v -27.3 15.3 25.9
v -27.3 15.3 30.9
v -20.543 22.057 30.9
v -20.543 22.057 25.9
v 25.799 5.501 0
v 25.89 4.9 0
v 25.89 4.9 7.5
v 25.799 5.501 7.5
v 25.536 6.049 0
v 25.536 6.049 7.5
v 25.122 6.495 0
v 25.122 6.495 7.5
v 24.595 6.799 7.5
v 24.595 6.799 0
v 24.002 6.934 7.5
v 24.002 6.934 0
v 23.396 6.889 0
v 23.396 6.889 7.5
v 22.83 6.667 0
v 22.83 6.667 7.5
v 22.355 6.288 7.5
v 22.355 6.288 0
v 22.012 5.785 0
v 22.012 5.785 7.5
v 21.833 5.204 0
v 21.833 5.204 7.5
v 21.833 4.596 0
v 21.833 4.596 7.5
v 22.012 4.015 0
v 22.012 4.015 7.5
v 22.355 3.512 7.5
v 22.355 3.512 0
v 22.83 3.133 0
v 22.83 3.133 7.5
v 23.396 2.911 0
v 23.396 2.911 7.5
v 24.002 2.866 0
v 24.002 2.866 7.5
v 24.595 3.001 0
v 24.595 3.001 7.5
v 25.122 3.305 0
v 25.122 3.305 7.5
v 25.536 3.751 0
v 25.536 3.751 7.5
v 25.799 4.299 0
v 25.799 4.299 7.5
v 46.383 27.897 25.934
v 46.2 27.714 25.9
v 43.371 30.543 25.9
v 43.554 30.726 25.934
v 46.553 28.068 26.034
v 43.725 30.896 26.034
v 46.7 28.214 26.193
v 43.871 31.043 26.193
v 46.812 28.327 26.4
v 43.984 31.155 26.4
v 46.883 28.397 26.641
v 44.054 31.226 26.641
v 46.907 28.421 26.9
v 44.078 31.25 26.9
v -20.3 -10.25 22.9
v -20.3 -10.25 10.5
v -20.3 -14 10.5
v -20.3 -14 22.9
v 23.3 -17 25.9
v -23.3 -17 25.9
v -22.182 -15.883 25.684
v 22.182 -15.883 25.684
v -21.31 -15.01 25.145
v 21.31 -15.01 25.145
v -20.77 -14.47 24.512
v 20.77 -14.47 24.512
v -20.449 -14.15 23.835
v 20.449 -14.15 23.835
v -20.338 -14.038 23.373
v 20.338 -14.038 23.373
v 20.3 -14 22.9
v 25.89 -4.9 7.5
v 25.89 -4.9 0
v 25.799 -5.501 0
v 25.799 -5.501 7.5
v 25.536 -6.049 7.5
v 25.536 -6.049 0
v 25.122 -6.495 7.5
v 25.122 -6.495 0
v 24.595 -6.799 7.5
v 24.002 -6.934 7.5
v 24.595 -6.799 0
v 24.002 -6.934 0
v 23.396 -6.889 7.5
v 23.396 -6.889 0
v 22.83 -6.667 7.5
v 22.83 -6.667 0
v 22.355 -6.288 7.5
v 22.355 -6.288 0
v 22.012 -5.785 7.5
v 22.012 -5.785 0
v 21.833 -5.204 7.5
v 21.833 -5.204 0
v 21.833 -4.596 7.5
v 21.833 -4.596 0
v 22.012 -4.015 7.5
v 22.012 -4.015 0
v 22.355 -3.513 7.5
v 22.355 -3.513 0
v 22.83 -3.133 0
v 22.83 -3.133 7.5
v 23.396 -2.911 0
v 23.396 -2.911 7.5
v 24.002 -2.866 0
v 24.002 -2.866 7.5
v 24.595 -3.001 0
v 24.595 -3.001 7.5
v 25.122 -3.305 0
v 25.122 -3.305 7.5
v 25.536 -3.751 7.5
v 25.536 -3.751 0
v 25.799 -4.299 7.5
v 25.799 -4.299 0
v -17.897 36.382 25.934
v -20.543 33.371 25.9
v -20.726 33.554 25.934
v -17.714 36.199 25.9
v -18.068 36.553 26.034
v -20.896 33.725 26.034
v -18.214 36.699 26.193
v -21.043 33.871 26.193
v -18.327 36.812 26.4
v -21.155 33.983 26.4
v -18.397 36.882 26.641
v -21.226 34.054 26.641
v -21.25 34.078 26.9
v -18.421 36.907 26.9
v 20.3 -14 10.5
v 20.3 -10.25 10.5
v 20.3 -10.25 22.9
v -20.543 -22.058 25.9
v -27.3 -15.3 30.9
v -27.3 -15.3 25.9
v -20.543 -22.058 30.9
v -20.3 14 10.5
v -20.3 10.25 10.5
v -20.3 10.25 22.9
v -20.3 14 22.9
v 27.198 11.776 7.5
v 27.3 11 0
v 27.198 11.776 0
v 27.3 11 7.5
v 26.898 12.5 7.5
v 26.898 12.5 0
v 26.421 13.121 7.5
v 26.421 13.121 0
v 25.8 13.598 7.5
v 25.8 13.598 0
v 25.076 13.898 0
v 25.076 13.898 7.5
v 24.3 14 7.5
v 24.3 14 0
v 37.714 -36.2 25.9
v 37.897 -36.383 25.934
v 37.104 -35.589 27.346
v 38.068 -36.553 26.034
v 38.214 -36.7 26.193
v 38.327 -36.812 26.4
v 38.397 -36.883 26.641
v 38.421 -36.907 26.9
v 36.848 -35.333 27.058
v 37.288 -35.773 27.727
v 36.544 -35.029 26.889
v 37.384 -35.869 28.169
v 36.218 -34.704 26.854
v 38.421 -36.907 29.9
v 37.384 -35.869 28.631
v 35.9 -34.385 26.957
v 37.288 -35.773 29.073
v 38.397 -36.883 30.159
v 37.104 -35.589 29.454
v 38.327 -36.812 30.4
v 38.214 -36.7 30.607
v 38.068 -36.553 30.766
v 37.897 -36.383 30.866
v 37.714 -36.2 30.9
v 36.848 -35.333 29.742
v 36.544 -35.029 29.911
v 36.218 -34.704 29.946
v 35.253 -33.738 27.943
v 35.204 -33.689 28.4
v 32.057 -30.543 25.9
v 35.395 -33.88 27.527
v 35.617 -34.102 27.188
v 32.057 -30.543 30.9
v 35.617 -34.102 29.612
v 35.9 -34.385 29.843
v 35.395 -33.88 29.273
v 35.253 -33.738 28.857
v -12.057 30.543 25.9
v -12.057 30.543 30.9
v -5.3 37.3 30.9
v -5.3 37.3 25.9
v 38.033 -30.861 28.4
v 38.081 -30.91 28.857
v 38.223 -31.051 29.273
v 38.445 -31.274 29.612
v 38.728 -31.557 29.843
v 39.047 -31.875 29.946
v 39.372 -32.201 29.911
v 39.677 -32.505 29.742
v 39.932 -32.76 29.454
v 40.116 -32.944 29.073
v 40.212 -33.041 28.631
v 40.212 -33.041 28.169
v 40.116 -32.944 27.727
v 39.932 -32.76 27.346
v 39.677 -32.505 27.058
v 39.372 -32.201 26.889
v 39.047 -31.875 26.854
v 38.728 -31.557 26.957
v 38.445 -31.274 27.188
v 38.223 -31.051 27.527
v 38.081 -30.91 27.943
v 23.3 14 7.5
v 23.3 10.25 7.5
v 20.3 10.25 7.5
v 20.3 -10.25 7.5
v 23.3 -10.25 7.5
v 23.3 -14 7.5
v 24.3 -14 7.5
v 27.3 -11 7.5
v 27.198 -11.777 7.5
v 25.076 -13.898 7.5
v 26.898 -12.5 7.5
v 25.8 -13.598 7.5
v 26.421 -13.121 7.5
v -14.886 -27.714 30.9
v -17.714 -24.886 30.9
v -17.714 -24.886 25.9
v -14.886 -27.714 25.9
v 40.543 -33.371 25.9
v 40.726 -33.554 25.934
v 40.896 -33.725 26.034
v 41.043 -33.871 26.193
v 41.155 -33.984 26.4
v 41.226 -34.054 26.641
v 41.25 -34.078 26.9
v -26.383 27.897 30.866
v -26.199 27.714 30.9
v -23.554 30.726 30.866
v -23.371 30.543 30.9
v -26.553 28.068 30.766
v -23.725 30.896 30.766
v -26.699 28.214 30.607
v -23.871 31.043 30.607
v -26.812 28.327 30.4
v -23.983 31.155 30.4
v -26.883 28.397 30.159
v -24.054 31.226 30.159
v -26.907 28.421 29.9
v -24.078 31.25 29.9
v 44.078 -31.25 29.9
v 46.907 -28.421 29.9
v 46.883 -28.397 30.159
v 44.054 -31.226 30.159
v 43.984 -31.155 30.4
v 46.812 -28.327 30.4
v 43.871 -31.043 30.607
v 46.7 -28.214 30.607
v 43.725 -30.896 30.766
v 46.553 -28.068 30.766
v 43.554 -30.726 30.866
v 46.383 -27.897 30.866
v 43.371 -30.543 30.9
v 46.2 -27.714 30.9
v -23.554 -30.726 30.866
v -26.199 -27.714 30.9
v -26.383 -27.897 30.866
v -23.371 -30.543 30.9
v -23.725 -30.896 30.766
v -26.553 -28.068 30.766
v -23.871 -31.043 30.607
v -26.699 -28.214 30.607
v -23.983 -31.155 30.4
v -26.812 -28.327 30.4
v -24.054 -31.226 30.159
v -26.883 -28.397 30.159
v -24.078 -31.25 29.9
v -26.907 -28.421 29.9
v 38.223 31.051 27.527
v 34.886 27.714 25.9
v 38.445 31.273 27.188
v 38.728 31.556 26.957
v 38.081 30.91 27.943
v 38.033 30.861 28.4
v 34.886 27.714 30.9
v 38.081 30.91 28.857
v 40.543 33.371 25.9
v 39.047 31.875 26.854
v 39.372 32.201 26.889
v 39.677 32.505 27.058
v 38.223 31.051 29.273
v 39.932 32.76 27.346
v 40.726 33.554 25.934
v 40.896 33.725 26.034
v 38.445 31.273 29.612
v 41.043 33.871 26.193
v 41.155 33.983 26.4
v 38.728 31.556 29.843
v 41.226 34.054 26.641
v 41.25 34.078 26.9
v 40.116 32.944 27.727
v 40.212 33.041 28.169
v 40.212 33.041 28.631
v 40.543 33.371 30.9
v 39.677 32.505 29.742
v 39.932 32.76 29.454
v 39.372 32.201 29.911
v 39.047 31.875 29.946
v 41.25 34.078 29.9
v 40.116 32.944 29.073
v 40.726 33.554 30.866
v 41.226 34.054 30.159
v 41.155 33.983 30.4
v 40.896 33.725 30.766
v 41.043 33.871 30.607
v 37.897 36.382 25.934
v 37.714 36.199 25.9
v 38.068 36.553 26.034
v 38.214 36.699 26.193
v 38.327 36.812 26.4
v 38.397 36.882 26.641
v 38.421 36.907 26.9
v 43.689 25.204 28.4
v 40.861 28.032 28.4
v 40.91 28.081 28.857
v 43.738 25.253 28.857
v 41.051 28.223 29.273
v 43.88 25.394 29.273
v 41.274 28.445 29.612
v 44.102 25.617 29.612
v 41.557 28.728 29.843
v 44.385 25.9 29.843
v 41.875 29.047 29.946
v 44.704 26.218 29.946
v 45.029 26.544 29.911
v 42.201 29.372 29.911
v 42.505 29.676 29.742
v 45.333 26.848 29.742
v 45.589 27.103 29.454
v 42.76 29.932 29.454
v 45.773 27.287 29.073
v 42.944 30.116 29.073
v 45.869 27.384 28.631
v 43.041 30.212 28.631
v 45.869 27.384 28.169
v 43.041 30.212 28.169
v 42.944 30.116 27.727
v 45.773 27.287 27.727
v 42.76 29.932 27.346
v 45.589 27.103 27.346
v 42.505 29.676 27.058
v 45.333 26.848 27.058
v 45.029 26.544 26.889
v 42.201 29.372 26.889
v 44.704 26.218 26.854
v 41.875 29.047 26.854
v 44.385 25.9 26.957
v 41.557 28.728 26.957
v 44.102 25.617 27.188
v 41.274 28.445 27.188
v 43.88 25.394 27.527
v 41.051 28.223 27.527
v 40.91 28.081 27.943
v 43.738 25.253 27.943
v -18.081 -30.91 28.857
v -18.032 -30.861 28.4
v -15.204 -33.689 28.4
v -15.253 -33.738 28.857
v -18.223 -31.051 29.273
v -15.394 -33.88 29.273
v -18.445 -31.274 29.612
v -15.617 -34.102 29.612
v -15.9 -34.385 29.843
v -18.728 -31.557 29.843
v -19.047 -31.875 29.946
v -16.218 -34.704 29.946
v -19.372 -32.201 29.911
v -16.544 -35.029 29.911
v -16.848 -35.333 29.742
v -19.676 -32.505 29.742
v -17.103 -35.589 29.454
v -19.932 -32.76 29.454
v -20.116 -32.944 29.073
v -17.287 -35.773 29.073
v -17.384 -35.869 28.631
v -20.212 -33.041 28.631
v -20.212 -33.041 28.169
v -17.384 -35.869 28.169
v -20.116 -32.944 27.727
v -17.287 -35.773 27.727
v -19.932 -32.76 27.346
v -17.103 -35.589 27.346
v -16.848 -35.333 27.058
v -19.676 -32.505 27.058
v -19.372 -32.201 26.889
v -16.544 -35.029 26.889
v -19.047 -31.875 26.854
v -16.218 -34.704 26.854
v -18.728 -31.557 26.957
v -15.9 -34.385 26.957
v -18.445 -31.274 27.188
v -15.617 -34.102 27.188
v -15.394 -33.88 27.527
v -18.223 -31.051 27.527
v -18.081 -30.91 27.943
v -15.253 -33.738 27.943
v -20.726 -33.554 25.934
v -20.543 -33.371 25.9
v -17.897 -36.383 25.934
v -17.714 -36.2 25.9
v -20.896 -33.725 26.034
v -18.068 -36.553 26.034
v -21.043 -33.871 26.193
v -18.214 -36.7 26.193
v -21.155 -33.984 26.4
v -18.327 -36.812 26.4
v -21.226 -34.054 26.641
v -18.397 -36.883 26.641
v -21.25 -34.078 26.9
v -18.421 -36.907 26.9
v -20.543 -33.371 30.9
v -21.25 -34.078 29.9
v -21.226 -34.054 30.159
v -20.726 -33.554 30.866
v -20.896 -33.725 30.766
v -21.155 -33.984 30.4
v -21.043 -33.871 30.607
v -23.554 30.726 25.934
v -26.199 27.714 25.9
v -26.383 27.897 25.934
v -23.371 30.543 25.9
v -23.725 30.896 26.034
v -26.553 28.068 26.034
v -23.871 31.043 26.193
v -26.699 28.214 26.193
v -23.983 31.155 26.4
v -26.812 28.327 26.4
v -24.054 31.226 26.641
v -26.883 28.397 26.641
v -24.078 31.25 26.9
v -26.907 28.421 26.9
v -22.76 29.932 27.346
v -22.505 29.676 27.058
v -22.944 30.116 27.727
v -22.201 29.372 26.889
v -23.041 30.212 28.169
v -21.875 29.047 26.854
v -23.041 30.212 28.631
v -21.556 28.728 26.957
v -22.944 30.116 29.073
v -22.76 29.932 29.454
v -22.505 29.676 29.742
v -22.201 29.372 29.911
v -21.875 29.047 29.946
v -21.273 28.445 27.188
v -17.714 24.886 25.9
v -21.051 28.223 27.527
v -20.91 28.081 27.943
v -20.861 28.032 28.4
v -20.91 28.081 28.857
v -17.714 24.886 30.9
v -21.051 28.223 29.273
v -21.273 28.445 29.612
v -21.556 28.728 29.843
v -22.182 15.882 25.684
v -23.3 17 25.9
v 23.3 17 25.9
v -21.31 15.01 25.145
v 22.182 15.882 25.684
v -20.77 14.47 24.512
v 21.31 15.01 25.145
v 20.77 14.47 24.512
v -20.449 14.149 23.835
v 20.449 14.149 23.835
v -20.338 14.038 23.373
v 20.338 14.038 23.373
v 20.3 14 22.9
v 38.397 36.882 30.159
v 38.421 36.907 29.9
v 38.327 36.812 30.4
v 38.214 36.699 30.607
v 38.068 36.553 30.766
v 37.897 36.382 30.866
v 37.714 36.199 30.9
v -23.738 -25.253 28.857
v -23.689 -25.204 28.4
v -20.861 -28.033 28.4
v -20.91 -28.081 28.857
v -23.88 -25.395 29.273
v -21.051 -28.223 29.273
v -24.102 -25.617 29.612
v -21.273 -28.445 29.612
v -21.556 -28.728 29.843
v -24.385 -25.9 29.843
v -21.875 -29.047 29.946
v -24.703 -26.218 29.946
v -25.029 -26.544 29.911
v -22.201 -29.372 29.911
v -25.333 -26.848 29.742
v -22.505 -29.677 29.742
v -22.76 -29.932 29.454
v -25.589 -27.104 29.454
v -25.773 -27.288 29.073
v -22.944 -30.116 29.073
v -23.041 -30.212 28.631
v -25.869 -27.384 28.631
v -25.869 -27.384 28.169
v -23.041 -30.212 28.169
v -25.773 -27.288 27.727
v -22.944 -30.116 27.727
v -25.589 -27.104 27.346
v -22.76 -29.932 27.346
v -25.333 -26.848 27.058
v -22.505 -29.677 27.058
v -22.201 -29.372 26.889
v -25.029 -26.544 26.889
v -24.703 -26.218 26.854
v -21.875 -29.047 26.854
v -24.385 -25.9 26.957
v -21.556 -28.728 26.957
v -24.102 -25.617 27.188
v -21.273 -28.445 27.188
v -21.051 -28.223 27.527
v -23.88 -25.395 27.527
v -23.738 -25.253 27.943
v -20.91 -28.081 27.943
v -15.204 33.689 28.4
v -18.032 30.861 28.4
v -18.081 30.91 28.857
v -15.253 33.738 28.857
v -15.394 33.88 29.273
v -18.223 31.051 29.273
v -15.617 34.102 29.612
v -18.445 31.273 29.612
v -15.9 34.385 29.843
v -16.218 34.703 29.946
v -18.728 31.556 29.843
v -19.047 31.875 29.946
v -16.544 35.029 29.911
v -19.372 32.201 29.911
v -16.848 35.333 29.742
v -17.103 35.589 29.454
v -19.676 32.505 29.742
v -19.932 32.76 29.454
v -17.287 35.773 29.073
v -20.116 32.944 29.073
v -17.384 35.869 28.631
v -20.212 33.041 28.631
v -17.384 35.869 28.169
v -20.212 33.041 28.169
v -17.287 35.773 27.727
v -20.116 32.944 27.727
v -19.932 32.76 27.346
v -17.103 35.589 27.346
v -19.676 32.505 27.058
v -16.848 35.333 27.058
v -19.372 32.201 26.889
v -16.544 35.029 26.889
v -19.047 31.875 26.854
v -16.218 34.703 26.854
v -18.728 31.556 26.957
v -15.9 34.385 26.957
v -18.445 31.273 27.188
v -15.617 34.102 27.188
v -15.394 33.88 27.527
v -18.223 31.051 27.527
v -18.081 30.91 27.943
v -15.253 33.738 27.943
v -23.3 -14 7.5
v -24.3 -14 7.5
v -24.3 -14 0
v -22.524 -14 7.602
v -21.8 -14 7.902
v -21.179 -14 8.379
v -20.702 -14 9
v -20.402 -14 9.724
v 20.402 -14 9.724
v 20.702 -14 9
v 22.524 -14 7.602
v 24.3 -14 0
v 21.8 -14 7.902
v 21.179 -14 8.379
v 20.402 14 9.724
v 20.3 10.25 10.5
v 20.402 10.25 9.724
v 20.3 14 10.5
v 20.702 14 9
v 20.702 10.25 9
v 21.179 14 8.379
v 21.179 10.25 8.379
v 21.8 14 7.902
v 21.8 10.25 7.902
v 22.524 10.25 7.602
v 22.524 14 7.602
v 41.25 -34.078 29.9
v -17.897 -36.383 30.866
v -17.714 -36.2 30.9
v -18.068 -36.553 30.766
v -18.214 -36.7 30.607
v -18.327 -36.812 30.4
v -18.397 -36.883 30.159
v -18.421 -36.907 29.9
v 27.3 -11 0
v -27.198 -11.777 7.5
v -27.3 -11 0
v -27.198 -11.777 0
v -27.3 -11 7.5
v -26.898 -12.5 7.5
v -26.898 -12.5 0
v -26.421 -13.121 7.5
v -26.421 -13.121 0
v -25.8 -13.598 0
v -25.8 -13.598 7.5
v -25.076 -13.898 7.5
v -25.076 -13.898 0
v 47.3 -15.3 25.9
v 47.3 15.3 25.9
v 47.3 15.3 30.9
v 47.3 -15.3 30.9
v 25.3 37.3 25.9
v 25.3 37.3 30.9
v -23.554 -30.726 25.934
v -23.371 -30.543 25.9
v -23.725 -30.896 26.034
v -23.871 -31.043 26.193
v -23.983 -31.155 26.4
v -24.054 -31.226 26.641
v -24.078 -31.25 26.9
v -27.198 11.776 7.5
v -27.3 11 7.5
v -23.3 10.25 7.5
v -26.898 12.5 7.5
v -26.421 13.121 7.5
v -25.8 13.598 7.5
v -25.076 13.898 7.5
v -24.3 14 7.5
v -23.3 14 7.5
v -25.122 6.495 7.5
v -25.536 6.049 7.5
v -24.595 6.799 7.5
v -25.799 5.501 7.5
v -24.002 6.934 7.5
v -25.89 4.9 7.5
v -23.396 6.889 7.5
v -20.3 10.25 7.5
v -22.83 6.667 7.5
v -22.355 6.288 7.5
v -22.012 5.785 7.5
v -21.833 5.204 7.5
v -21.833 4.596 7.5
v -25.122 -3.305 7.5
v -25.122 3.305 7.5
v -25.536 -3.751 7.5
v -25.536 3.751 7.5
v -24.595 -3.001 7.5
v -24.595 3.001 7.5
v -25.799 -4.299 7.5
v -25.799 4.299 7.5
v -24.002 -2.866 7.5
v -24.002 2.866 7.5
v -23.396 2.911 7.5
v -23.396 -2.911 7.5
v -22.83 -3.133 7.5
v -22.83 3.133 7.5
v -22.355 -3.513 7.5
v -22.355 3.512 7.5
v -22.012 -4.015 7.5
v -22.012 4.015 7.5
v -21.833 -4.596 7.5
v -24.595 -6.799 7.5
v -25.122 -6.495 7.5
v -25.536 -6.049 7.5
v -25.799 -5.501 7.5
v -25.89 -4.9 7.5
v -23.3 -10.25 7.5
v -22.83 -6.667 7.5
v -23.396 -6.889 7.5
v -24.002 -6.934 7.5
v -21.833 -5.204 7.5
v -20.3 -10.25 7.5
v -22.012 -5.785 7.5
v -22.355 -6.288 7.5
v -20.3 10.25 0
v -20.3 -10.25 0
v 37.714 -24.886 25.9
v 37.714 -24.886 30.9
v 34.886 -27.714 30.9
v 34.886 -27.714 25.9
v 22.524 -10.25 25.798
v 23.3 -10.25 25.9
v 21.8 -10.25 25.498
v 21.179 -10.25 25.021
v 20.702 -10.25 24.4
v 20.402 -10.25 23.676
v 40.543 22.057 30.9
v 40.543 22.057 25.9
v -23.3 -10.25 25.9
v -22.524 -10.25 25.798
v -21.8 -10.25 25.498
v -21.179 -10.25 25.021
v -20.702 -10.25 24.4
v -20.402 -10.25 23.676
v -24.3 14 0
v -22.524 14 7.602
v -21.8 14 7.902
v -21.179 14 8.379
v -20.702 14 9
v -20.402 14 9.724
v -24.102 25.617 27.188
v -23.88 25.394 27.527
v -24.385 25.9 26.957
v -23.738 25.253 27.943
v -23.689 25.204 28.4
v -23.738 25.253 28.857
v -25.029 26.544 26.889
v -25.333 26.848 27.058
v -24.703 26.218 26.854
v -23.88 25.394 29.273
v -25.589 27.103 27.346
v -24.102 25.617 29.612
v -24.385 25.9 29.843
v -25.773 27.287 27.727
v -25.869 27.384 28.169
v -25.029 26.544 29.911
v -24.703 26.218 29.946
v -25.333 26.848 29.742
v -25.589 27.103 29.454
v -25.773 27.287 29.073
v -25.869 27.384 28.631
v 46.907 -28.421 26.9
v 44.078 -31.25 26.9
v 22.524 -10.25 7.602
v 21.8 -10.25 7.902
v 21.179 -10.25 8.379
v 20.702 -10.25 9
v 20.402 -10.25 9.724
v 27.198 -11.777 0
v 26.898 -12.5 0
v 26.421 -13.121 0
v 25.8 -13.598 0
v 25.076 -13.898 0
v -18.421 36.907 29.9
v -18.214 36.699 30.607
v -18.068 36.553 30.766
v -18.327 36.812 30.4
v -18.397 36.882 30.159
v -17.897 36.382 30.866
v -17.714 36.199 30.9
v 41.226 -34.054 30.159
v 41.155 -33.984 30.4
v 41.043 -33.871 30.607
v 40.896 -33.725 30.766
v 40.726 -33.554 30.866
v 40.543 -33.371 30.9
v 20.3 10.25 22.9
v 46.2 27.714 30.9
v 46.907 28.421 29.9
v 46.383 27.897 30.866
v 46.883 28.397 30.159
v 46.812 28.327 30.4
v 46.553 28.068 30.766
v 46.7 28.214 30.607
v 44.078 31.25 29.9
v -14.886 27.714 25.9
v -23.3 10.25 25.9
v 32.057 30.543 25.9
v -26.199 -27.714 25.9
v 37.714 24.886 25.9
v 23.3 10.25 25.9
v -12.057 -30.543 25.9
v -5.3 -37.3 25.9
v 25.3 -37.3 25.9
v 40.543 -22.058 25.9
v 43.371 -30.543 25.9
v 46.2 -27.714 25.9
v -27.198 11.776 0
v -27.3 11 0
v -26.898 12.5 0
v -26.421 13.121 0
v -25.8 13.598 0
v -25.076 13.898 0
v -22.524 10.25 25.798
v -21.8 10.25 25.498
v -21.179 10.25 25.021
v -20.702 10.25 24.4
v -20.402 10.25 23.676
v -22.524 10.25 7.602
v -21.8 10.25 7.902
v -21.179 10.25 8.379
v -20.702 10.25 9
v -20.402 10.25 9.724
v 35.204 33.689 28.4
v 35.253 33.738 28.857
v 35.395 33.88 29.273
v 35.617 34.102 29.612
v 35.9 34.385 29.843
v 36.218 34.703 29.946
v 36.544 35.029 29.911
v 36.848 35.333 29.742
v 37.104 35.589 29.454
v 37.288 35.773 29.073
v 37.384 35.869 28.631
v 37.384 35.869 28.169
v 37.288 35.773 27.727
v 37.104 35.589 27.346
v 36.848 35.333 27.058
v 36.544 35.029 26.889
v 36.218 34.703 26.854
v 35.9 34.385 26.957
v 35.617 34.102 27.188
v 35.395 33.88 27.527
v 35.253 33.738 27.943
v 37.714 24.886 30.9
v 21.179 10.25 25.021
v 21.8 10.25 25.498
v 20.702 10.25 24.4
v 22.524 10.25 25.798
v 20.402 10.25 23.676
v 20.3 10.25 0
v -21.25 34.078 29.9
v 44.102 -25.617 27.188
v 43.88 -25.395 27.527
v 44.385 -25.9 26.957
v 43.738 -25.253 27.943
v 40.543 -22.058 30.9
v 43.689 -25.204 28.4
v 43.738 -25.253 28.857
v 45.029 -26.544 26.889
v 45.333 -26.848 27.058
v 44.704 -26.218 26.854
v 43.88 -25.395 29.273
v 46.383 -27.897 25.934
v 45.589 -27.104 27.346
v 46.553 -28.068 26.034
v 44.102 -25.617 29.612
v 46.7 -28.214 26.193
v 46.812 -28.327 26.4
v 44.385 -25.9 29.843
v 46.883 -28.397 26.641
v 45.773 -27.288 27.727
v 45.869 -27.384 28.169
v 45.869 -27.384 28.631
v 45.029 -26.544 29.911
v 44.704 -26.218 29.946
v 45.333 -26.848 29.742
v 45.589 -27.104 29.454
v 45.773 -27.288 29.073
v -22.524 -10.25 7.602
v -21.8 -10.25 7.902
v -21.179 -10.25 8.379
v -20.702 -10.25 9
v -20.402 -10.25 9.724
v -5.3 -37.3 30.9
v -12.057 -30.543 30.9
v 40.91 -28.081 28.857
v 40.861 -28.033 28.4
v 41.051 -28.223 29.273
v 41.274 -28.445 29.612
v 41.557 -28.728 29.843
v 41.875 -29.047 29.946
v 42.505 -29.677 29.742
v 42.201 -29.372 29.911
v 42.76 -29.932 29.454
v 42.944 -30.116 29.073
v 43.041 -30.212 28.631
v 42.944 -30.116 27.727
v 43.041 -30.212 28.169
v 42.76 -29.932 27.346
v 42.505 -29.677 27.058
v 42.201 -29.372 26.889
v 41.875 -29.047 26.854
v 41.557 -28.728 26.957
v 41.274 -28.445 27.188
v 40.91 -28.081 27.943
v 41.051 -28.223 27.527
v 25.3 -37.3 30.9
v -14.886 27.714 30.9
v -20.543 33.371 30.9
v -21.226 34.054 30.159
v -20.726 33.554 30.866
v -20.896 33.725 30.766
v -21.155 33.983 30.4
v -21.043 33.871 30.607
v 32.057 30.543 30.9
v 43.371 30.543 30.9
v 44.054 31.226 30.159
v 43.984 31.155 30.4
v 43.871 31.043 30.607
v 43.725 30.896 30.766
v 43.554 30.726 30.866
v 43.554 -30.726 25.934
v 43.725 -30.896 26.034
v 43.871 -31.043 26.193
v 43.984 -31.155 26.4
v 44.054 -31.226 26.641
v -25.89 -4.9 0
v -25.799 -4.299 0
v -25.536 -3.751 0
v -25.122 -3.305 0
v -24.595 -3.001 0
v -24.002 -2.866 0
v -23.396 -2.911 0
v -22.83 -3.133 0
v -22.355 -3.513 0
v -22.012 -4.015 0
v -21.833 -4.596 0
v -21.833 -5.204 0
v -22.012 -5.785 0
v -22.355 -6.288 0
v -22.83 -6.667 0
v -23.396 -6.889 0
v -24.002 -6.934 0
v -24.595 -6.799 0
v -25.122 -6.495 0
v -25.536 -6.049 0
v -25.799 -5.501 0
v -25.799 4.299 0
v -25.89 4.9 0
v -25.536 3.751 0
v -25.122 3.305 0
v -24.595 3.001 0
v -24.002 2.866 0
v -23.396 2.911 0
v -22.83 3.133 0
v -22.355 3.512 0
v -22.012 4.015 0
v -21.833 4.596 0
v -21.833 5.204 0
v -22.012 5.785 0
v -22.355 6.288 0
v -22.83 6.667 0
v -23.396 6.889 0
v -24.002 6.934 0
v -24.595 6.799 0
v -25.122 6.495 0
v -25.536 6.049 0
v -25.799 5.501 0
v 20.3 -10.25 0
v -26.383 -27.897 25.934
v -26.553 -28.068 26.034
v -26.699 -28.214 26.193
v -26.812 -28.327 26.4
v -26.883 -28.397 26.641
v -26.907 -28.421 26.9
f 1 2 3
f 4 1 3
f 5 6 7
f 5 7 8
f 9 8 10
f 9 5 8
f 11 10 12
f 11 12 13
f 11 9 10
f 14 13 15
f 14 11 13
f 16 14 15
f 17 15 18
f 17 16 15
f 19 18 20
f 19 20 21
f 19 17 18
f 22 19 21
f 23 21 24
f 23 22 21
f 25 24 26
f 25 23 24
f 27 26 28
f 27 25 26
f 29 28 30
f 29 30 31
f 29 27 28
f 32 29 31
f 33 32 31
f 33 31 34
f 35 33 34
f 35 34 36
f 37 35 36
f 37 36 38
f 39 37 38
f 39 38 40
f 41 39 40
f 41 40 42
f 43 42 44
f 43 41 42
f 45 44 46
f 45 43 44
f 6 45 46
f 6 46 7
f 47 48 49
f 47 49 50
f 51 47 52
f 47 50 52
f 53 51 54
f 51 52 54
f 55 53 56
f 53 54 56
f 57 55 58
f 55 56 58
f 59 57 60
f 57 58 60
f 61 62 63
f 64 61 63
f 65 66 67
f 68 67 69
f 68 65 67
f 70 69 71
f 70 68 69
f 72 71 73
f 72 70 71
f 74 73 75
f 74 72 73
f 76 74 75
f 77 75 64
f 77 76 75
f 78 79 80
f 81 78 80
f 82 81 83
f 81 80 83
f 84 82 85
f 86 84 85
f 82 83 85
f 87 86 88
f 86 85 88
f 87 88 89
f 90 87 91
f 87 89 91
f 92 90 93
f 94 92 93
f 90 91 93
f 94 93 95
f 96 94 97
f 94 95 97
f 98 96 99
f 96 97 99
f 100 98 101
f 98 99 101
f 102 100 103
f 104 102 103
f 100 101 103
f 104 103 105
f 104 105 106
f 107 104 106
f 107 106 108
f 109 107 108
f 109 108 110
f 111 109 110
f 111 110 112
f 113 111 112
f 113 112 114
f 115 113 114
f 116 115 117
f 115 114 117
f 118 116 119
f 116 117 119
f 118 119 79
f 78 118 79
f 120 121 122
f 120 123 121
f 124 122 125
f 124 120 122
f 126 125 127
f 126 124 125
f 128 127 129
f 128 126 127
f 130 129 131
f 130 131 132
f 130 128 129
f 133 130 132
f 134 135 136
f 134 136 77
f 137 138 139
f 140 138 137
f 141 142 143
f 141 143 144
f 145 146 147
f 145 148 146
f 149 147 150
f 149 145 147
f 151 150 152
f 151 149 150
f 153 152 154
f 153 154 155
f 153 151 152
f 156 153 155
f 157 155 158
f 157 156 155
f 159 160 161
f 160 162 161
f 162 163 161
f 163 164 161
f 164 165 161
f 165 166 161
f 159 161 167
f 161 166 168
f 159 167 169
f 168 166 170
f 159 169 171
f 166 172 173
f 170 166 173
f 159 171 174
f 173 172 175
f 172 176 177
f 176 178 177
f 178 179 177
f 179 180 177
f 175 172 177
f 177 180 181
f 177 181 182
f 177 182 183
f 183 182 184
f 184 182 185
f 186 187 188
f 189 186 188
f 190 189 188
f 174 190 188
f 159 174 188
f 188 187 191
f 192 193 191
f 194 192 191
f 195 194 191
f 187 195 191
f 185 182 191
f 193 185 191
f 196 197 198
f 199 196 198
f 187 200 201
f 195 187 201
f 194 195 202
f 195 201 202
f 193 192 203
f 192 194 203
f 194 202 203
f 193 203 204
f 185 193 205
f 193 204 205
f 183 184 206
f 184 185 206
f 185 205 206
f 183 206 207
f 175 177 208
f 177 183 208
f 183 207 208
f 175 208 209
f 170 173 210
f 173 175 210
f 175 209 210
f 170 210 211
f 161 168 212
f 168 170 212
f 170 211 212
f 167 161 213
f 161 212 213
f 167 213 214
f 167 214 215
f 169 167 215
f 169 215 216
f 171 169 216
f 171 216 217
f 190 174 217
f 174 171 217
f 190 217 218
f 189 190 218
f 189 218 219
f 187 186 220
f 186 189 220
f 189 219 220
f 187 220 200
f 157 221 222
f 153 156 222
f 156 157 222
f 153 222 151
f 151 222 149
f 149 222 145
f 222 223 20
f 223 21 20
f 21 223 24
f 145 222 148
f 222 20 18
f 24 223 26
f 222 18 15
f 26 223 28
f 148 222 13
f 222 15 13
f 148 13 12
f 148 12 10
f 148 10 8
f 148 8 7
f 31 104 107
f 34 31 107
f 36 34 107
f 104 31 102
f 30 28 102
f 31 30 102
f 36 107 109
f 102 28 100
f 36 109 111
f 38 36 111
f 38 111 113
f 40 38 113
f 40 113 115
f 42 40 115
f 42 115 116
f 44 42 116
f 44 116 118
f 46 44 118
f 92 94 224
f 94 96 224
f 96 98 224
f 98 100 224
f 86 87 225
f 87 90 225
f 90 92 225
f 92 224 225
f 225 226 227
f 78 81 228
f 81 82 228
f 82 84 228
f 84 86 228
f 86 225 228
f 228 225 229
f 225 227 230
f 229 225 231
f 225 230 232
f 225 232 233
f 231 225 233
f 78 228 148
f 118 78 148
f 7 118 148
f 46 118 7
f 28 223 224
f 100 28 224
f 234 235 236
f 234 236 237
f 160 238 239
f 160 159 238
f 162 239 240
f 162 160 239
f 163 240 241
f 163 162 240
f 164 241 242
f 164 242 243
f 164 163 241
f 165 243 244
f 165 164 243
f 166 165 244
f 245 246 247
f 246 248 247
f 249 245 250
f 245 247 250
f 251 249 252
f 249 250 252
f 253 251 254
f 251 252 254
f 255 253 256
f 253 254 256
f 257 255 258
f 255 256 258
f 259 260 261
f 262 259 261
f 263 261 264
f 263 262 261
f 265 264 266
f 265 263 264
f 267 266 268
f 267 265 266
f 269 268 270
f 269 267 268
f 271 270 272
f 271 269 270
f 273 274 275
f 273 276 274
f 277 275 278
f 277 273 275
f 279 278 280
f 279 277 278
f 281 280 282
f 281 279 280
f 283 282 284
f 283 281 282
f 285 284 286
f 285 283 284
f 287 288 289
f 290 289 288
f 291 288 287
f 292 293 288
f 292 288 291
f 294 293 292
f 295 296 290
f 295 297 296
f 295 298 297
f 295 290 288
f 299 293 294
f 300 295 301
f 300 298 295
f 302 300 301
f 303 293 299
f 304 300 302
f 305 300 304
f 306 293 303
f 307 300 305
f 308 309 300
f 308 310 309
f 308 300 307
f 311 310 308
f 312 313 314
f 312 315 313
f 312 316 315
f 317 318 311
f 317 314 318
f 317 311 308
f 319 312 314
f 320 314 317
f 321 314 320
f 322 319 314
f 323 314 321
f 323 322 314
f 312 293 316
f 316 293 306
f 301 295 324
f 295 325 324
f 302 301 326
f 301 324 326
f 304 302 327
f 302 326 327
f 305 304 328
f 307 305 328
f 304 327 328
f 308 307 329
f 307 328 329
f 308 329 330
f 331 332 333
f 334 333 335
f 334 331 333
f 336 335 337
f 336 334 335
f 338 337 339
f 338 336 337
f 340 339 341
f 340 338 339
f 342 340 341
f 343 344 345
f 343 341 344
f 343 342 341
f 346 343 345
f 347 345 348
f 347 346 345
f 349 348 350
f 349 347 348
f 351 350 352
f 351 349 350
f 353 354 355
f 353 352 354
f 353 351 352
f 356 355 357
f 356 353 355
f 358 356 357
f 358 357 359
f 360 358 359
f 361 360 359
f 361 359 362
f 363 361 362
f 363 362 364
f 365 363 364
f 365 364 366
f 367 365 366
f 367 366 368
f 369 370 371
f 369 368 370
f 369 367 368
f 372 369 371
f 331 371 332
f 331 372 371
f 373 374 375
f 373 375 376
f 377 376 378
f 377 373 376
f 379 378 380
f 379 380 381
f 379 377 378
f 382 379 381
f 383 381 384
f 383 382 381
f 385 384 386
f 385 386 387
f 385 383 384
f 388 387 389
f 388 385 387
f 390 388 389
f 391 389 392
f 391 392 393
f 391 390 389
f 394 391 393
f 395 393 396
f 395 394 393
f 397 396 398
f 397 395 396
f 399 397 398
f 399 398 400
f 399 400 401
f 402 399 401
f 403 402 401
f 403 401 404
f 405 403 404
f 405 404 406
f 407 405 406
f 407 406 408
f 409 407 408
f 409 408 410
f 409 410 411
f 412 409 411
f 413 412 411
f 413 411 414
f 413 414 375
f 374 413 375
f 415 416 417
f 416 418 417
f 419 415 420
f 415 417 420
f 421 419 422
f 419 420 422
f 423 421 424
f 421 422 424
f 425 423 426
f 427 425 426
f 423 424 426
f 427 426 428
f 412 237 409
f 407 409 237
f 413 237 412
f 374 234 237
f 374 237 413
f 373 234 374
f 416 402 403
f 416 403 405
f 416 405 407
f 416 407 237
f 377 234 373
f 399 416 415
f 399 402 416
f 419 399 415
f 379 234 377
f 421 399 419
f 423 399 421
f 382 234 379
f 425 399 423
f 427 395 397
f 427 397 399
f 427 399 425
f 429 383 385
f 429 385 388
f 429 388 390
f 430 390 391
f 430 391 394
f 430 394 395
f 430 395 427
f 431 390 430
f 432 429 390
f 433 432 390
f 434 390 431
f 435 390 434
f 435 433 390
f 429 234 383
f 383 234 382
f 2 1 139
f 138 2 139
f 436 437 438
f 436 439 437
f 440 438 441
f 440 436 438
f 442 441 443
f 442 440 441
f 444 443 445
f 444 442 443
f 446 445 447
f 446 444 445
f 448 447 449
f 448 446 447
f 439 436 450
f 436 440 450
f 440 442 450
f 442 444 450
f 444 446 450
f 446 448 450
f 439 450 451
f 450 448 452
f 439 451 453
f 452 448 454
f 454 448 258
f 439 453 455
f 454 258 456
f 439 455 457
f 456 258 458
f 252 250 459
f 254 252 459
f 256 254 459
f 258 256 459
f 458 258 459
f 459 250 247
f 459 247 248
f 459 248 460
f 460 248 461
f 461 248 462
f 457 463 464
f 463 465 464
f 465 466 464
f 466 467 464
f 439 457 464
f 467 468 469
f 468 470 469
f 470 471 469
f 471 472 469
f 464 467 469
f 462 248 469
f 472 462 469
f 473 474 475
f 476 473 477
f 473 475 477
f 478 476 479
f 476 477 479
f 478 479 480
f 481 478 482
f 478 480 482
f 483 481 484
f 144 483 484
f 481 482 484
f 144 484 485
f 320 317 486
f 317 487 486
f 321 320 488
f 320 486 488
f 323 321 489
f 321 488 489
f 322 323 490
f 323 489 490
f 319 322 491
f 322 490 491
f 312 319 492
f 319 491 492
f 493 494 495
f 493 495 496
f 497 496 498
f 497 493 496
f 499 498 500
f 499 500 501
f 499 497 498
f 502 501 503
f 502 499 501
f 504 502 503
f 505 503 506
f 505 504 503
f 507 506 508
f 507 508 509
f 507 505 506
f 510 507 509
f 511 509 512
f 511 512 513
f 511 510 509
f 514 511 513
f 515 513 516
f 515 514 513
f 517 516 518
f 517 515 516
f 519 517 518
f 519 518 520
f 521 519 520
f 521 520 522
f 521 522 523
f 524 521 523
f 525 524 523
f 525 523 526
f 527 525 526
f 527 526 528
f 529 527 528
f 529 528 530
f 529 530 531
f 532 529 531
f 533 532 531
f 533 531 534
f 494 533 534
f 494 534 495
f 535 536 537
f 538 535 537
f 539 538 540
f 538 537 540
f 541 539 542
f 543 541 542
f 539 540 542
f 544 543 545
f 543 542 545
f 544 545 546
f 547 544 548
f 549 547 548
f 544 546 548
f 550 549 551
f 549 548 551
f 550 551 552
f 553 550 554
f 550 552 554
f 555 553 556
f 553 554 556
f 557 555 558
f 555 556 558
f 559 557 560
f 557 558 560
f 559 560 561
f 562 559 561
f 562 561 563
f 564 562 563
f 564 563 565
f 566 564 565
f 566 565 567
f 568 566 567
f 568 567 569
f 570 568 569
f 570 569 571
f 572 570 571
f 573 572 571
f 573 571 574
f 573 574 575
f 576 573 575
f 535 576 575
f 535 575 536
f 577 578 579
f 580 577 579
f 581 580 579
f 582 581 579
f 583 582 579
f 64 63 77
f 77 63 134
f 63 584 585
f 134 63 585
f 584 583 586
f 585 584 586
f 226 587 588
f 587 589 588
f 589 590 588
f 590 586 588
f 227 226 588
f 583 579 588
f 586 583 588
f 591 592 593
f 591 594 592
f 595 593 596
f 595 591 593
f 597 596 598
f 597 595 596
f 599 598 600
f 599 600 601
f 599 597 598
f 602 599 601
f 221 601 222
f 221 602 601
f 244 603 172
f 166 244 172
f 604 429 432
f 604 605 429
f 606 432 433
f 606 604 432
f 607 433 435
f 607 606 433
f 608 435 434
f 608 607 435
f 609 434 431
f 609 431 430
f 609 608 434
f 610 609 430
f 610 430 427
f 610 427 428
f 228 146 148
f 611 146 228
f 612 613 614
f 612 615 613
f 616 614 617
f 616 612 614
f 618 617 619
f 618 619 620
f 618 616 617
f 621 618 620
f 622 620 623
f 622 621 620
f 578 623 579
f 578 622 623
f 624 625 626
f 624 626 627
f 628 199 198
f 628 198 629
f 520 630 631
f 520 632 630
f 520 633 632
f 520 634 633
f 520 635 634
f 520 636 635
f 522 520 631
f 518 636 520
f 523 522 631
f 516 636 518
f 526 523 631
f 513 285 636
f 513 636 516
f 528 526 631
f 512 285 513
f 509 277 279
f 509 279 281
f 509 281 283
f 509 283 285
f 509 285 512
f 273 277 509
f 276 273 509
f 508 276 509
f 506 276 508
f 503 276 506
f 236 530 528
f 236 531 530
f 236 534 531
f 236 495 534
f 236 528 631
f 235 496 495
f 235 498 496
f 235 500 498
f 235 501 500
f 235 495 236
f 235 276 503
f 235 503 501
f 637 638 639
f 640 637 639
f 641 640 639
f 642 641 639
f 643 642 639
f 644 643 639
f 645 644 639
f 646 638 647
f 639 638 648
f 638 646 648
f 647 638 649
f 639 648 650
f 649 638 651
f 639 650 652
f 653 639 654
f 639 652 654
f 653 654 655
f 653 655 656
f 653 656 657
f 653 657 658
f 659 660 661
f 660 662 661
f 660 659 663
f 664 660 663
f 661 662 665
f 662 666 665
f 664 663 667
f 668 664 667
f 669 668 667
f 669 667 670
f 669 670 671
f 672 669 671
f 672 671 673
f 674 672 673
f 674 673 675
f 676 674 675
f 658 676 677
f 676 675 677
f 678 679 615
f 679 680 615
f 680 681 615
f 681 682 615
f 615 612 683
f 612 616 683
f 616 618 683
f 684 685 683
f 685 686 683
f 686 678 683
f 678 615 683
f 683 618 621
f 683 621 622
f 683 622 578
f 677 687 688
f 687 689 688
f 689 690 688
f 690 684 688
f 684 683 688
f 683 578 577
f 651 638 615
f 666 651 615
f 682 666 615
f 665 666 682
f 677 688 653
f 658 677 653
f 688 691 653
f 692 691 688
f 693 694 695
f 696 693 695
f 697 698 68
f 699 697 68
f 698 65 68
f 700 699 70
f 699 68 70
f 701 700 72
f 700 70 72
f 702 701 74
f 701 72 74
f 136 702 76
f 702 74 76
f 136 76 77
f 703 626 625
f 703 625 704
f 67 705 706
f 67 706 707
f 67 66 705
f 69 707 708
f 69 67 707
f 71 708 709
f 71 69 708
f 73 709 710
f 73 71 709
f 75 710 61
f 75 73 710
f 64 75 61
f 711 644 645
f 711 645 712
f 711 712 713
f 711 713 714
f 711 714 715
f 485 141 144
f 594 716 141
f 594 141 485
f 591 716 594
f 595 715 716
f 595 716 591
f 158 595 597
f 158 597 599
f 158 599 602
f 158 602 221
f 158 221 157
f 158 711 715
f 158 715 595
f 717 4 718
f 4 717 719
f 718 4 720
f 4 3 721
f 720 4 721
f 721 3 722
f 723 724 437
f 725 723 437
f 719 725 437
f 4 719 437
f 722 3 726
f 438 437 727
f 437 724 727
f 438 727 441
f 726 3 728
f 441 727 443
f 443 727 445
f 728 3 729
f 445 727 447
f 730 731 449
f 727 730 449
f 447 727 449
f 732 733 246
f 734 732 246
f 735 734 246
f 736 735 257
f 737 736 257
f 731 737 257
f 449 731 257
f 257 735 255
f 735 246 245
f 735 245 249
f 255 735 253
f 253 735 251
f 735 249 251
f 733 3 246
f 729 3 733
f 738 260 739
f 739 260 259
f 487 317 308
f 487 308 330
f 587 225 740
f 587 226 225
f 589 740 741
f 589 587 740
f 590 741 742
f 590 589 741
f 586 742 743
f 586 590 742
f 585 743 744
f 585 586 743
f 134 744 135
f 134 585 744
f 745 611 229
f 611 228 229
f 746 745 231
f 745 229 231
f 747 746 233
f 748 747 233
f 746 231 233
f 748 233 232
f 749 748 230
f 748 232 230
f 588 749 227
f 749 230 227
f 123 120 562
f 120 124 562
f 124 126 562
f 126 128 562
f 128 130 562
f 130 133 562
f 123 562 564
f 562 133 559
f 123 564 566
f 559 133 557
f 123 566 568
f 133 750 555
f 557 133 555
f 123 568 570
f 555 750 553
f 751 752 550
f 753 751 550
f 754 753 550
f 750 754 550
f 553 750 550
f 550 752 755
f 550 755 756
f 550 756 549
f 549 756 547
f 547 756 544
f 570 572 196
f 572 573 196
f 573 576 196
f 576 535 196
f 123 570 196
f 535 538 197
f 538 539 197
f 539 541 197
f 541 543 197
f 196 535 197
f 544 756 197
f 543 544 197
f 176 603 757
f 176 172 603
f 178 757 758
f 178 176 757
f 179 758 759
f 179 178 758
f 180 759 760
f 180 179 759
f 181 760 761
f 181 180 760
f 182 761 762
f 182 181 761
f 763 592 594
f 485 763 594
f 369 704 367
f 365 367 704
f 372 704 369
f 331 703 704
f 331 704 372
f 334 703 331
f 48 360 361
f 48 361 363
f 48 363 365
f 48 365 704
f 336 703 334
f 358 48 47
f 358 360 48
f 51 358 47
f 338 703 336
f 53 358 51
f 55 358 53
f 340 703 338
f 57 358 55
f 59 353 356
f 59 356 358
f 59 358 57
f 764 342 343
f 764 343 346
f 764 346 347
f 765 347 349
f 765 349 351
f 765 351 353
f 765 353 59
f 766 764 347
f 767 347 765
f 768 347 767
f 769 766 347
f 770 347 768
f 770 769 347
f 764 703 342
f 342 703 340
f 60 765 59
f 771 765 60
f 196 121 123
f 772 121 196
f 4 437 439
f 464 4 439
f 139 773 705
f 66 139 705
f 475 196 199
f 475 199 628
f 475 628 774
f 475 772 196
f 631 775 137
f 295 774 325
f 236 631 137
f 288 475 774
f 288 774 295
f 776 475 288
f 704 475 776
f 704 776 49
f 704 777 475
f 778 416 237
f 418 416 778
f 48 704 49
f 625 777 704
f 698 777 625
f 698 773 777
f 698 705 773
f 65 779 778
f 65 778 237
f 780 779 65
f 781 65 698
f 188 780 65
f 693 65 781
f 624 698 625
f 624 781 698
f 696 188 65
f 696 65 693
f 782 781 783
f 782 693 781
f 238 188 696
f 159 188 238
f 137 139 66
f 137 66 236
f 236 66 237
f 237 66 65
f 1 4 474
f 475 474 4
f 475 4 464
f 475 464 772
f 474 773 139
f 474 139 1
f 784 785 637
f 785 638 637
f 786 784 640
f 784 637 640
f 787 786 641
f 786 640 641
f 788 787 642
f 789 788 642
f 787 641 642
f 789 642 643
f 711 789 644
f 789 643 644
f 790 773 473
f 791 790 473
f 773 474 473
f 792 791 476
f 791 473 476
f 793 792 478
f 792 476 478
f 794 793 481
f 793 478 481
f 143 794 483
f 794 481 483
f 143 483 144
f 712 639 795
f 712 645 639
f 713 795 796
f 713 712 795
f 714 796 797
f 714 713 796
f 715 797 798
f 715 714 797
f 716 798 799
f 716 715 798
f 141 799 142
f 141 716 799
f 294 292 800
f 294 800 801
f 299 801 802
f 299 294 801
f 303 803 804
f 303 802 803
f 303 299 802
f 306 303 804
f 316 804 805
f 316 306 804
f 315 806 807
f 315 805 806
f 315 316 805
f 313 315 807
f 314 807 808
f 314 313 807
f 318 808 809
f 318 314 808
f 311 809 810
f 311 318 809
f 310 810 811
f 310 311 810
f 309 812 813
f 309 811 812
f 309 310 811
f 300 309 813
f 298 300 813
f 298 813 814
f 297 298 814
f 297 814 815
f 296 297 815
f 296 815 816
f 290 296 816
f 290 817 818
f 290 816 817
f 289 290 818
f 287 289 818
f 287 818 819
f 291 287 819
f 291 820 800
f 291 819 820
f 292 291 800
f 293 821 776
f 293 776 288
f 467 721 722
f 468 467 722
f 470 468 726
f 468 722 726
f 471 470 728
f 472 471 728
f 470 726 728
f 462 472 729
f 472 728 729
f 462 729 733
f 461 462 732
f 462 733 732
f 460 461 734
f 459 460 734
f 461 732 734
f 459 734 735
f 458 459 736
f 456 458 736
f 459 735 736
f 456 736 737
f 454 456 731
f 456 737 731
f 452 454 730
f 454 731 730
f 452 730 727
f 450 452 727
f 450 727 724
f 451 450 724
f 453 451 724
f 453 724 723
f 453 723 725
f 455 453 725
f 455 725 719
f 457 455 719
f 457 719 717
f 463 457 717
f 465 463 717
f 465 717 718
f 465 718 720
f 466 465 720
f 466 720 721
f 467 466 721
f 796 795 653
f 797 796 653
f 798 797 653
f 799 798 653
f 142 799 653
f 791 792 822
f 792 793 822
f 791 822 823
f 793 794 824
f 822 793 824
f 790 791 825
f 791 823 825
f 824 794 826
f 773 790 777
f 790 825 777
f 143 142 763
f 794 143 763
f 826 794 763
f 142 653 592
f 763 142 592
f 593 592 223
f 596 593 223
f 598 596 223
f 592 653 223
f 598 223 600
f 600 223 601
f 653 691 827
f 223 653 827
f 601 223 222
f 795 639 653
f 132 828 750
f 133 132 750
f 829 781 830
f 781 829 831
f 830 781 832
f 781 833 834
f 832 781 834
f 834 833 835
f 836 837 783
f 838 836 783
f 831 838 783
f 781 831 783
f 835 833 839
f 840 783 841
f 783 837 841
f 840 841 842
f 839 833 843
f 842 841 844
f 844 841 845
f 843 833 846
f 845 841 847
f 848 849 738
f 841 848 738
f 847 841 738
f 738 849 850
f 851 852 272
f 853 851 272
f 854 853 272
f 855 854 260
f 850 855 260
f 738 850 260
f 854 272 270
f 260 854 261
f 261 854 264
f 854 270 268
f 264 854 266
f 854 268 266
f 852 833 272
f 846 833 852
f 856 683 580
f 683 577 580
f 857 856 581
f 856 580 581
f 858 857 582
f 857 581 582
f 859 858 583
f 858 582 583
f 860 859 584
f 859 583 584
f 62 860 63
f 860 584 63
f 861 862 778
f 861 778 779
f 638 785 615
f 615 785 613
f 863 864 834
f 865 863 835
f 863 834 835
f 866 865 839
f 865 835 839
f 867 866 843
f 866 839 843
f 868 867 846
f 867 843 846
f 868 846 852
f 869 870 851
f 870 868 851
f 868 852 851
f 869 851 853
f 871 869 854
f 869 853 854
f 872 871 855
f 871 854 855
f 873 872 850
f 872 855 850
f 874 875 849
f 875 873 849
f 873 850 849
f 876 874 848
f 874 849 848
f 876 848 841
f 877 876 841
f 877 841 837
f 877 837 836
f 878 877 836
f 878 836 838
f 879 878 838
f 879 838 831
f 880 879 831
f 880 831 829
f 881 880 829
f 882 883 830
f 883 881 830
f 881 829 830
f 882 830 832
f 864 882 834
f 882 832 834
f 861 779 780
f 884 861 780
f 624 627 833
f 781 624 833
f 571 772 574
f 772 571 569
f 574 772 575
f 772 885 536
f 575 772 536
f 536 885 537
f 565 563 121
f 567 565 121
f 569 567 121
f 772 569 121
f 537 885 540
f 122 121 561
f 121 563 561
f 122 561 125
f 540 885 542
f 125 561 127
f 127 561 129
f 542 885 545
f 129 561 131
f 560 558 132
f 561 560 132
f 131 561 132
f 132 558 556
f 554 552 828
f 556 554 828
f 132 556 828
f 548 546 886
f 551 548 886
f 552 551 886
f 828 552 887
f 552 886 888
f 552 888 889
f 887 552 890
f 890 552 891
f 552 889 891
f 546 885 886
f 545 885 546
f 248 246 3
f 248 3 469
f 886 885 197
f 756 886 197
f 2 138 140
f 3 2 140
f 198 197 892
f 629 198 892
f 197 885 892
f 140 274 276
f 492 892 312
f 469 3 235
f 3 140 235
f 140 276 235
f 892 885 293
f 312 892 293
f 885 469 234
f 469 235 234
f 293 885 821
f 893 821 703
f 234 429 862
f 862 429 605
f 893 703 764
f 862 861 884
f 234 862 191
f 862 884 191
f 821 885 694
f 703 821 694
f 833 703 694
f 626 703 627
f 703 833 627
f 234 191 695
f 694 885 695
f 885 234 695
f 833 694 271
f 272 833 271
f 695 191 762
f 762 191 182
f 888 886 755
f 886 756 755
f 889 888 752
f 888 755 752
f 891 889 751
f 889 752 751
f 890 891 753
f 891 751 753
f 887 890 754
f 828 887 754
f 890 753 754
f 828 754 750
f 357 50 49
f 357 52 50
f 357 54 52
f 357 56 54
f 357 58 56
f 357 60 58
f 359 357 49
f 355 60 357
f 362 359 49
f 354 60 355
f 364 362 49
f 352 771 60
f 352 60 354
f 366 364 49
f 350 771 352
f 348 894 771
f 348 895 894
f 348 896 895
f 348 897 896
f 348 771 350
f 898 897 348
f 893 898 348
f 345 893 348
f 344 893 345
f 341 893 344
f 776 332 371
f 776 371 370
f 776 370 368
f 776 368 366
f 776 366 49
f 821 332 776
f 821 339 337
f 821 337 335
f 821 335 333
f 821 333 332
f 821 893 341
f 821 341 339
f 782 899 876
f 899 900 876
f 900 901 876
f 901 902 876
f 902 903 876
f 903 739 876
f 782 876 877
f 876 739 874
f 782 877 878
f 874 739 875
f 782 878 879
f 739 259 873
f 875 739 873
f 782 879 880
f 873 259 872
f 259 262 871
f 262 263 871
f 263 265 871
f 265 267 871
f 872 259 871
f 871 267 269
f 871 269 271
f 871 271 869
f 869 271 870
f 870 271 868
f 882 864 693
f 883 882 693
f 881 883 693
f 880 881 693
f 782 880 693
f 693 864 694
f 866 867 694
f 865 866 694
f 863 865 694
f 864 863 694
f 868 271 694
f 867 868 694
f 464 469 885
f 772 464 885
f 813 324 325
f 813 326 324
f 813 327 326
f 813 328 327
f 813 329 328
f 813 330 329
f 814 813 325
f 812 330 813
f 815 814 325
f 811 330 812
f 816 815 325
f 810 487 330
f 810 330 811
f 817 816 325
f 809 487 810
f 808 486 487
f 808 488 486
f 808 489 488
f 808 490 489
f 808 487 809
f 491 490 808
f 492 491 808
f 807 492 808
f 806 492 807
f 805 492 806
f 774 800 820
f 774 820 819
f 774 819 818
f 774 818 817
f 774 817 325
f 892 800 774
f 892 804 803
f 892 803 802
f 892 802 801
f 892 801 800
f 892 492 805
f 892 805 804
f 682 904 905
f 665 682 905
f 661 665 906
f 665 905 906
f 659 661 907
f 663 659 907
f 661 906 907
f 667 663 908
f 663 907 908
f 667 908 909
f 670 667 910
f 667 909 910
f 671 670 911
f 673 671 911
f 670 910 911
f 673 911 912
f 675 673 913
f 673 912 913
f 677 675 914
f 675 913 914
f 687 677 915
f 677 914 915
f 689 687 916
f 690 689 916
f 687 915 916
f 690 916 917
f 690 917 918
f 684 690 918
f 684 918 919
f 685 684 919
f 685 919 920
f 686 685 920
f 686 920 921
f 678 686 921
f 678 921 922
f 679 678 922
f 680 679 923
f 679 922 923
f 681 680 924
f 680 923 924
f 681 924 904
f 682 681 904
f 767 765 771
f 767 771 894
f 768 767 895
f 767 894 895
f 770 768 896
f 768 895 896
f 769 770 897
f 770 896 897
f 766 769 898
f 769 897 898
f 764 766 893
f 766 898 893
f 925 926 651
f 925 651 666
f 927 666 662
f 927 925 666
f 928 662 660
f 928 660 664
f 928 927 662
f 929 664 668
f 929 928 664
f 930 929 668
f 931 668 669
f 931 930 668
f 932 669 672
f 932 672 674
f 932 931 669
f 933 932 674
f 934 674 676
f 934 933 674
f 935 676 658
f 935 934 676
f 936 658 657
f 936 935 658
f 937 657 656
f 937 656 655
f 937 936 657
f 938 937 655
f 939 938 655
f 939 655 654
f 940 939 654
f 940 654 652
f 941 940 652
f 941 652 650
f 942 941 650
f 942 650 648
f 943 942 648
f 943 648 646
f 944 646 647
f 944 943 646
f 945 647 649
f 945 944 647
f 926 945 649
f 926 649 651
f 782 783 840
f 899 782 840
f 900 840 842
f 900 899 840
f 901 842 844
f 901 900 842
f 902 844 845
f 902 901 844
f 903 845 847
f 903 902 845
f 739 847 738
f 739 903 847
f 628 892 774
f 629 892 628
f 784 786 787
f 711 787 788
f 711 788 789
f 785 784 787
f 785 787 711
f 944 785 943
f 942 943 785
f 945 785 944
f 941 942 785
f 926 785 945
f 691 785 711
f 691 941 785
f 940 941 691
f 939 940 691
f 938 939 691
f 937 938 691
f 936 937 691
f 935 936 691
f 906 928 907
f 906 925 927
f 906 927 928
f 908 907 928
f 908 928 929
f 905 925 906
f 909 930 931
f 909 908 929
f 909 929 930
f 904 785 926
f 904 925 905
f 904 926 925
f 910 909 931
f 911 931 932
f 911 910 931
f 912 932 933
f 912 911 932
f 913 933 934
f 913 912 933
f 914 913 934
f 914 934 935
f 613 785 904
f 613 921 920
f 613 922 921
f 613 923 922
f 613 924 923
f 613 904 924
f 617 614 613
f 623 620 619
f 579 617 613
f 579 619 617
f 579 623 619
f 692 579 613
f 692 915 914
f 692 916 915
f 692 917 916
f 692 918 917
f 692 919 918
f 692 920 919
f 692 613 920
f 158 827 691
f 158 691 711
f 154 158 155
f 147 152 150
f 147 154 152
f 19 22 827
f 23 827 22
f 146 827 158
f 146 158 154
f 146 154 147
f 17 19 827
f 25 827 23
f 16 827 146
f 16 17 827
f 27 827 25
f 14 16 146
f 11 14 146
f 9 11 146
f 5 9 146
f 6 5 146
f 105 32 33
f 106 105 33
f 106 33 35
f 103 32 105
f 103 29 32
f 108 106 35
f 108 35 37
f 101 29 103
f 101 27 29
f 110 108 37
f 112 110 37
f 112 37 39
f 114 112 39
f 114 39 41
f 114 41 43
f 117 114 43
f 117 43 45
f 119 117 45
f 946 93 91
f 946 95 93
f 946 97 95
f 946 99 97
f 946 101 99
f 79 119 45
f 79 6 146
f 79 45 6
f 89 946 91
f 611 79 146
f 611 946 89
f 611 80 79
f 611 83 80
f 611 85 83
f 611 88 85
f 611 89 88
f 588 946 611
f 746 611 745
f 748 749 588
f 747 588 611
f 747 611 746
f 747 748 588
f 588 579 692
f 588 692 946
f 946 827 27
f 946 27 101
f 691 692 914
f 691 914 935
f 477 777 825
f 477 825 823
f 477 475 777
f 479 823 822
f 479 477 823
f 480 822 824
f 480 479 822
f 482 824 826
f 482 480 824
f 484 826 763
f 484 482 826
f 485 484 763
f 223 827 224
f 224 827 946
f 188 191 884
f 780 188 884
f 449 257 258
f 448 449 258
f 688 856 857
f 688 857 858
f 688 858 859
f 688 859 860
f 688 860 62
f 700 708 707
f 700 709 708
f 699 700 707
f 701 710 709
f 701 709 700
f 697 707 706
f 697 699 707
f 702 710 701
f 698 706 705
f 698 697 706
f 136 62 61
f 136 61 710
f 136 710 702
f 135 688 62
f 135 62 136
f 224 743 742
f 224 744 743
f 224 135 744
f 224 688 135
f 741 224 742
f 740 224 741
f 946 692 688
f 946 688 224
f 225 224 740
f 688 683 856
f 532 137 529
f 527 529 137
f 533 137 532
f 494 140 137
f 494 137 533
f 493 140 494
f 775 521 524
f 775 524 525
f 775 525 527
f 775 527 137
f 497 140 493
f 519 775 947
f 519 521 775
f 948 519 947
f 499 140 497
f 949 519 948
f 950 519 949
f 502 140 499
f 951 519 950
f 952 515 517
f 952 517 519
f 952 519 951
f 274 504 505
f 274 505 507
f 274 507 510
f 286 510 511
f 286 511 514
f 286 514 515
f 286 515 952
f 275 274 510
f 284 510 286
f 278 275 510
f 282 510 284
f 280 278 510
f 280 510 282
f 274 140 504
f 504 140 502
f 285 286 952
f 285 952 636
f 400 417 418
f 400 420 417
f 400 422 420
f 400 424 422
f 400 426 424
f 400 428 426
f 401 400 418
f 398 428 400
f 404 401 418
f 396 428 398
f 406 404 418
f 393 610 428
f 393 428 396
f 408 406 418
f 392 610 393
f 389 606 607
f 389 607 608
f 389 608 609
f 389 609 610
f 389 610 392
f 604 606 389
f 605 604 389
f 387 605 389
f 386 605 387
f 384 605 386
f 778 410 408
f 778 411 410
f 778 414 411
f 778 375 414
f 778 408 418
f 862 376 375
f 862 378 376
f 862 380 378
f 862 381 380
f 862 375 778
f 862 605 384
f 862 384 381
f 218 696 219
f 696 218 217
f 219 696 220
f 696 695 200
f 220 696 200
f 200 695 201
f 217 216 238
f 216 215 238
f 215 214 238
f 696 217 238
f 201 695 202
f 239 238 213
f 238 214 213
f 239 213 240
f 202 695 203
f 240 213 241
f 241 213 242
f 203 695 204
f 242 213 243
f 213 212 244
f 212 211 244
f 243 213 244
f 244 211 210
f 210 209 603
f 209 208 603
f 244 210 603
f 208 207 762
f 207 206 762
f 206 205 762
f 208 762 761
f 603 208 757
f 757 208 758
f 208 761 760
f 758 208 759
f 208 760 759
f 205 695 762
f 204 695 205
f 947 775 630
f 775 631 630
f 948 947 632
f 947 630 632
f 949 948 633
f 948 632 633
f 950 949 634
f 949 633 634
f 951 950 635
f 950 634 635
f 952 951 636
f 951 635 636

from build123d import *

# Parameters (mm, degrees)
SKETCH2_W            = 54.6
SKETCH2_H            = 28
SKETCH2_R            = 2.04
SKETCH2_W_2          = 40.6
SKETCH2_H_2          = 20.5
BOSS_EXTRUDE1_DEPTH  = 7.5
SKETCH3_W            = 40.6
SKETCH3_H            = 3.75
BOSS_EXTRUDE2_DEPTH  = 18.4
SKETCH7_W            = 74.600133011
SKETCH7_H            = 74.600133011
BOSS_EXTRUDE4_DEPTH  = 5
CUT_EXTRUDE2_DEPTH   = 5
SKETCH9_R            = 1.55
CUT_EXTRUDE3_DEPTH   = 16
FILLET3_R            = 1
FILLET3_OF_MIRROR4_R = 1
FILLET4_R            = 3


# Read off the part's stored shape, not the designer's step: Mirror5
with BuildPart() as part:
    # Sketch2 → Boss-Extrude1 (new body)
    with BuildSketch(Plane.XY):
        Rectangle(SKETCH2_W, SKETCH2_H)
        with Locations((23.85, 4.9)):
            Circle(SKETCH2_R, mode=Mode.SUBTRACT)
        with Locations(Location((23.85, -4.9, 0), (0, 0, 180))):
            Circle(SKETCH2_R, mode=Mode.SUBTRACT)
        with Locations((-23.85, -4.9)):
            Circle(SKETCH2_R, mode=Mode.SUBTRACT)
        with Locations(Location((-23.85, 4.9, 0), (0, 0, 180))):
            Circle(SKETCH2_R, mode=Mode.SUBTRACT)
        Rectangle(SKETCH2_W_2, SKETCH2_H_2, mode=Mode.SUBTRACT)
    extrude(amount=BOSS_EXTRUDE1_DEPTH)

    # Sketch3 → Boss-Extrude2 (add)
    with BuildSketch(Plane.XY.offset(7.5)):
        with Locations((0, 12.125)):
            Rectangle(SKETCH3_W, SKETCH3_H)
        with Locations((0, -12.125)):
            Rectangle(SKETCH3_W, SKETCH3_H)
    extrude(amount=BOSS_EXTRUDE2_DEPTH)

    # Sketch7 → Boss-Extrude4 (add)
    with BuildSketch(Plane.XY.offset(25.9)):
        with Locations((10.000066505, -7.842e-05)):
            Rectangle(SKETCH7_W, SKETCH7_H)
    extrude(amount=BOSS_EXTRUDE4_DEPTH)

    # Sketch8 → Cut-Extrude2 (cut)
    with BuildSketch(Plane.XY.offset(30.9)):
        Polygon((-27.3, 15.299988086), (-20.542640687, 22.057347399), (-26.906601718, 28.421308429), (-24.078174593, 31.249735554), (-17.714213562, 24.885774524), (-14.885786438, 27.714201648), (-21.249747468, 34.078162679), (-18.421320344, 36.906589804), (-12.057359313, 30.542628773), (-5.3, 37.299988086), (-27.3, 37.299988086), align=None)
    cut_extrude2 = extrude(amount=-CUT_EXTRUDE2_DEPTH, mode=Mode.SUBTRACT)

    # Sketch9 → Cut-Extrude3 (cut)
    with BuildSketch(Plane(origin=(0.757353356, 0.757353356, 0), x_dir=(0, 0, 1), z_dir=(-0.7071067811865474, -0.7071067811865477, 0))):
        with Locations(Location((28.4, 36.122740454, 0), (0, 0, 270))):
            Circle(SKETCH9_R)
    cut_extrude3 = extrude(amount=-CUT_EXTRUDE3_DEPTH, mode=Mode.SUBTRACT)

    # Fillet3
    fillet3_edges = [part.edges().sort_by_distance(p)[0] for p in [
        (-25.492388155, 29.835521992, 30.9),
        (-19.835533906, 35.492376241, 30.9),
        (-19.835533906, 35.492376241, 25.9),
        (-25.492388155, 29.835521992, 25.9),
    ]]
    fillet(fillet3_edges, radius=FILLET3_R)

    # Mirror4: Cut-Extrude2, Cut-Extrude3 across plane
    add(cut_extrude2.mirror(Plane.ZY.offset(-10.000066506)), mode=Mode.SUBTRACT)
    add(cut_extrude3.mirror(Plane.ZY.offset(-10.000066506)), mode=Mode.SUBTRACT)

    # Fillet3 of Mirror4
    fillet3_of_mirror4_edges = [part.edges().sort_by_distance(p)[0] for p in [
        (45.492521167, 29.835521992, 30.9),
        (39.835666917, 35.492376241, 30.9),
        (39.835666917, 35.492376241, 25.9),
        (45.492521167, 29.835521992, 25.9),
    ]]
    fillet(fillet3_of_mirror4_edges, radius=FILLET3_OF_MIRROR4_R)

    # Mirror5
    split(bisect_by=Plane.ZX.offset(-7.842e-05), keep=Keep.TOP)

    # Mirror5 2: part across plane


with BuildPart() as part_1:
    add(part.part)
    add(part.part.mirror(Plane.ZX.offset(-7.842e-05)))

    # Fillet4
    fillet4_edges = [part_1.edges().sort_by_distance(p)[0] for p in [
        (-20.3, 12.125, 7.5),
        (20.3, 12.125, 7.5),
        (0, 14, 25.9),
        (-20.3, 12.125, 25.9),
        (20.3, 12.125, 25.9),
        (-20.3, -12.125156839, 7.5),
        (20.3, -12.125156839, 7.5),
        (-20.3, -12.125156839, 25.9),
        (0, -14.000156839, 25.9),
        (20.3, -12.125156839, 25.9),
        (-27.3, -14.000156839, 3.75),
        (-27.3, 14, 3.75),
        (27.3, 14, 3.75),
        (27.3, -14.000156839, 3.75),
    ]]
    fillet(fillet4_edges, radius=FILLET4_R)


solid = part_1.part
